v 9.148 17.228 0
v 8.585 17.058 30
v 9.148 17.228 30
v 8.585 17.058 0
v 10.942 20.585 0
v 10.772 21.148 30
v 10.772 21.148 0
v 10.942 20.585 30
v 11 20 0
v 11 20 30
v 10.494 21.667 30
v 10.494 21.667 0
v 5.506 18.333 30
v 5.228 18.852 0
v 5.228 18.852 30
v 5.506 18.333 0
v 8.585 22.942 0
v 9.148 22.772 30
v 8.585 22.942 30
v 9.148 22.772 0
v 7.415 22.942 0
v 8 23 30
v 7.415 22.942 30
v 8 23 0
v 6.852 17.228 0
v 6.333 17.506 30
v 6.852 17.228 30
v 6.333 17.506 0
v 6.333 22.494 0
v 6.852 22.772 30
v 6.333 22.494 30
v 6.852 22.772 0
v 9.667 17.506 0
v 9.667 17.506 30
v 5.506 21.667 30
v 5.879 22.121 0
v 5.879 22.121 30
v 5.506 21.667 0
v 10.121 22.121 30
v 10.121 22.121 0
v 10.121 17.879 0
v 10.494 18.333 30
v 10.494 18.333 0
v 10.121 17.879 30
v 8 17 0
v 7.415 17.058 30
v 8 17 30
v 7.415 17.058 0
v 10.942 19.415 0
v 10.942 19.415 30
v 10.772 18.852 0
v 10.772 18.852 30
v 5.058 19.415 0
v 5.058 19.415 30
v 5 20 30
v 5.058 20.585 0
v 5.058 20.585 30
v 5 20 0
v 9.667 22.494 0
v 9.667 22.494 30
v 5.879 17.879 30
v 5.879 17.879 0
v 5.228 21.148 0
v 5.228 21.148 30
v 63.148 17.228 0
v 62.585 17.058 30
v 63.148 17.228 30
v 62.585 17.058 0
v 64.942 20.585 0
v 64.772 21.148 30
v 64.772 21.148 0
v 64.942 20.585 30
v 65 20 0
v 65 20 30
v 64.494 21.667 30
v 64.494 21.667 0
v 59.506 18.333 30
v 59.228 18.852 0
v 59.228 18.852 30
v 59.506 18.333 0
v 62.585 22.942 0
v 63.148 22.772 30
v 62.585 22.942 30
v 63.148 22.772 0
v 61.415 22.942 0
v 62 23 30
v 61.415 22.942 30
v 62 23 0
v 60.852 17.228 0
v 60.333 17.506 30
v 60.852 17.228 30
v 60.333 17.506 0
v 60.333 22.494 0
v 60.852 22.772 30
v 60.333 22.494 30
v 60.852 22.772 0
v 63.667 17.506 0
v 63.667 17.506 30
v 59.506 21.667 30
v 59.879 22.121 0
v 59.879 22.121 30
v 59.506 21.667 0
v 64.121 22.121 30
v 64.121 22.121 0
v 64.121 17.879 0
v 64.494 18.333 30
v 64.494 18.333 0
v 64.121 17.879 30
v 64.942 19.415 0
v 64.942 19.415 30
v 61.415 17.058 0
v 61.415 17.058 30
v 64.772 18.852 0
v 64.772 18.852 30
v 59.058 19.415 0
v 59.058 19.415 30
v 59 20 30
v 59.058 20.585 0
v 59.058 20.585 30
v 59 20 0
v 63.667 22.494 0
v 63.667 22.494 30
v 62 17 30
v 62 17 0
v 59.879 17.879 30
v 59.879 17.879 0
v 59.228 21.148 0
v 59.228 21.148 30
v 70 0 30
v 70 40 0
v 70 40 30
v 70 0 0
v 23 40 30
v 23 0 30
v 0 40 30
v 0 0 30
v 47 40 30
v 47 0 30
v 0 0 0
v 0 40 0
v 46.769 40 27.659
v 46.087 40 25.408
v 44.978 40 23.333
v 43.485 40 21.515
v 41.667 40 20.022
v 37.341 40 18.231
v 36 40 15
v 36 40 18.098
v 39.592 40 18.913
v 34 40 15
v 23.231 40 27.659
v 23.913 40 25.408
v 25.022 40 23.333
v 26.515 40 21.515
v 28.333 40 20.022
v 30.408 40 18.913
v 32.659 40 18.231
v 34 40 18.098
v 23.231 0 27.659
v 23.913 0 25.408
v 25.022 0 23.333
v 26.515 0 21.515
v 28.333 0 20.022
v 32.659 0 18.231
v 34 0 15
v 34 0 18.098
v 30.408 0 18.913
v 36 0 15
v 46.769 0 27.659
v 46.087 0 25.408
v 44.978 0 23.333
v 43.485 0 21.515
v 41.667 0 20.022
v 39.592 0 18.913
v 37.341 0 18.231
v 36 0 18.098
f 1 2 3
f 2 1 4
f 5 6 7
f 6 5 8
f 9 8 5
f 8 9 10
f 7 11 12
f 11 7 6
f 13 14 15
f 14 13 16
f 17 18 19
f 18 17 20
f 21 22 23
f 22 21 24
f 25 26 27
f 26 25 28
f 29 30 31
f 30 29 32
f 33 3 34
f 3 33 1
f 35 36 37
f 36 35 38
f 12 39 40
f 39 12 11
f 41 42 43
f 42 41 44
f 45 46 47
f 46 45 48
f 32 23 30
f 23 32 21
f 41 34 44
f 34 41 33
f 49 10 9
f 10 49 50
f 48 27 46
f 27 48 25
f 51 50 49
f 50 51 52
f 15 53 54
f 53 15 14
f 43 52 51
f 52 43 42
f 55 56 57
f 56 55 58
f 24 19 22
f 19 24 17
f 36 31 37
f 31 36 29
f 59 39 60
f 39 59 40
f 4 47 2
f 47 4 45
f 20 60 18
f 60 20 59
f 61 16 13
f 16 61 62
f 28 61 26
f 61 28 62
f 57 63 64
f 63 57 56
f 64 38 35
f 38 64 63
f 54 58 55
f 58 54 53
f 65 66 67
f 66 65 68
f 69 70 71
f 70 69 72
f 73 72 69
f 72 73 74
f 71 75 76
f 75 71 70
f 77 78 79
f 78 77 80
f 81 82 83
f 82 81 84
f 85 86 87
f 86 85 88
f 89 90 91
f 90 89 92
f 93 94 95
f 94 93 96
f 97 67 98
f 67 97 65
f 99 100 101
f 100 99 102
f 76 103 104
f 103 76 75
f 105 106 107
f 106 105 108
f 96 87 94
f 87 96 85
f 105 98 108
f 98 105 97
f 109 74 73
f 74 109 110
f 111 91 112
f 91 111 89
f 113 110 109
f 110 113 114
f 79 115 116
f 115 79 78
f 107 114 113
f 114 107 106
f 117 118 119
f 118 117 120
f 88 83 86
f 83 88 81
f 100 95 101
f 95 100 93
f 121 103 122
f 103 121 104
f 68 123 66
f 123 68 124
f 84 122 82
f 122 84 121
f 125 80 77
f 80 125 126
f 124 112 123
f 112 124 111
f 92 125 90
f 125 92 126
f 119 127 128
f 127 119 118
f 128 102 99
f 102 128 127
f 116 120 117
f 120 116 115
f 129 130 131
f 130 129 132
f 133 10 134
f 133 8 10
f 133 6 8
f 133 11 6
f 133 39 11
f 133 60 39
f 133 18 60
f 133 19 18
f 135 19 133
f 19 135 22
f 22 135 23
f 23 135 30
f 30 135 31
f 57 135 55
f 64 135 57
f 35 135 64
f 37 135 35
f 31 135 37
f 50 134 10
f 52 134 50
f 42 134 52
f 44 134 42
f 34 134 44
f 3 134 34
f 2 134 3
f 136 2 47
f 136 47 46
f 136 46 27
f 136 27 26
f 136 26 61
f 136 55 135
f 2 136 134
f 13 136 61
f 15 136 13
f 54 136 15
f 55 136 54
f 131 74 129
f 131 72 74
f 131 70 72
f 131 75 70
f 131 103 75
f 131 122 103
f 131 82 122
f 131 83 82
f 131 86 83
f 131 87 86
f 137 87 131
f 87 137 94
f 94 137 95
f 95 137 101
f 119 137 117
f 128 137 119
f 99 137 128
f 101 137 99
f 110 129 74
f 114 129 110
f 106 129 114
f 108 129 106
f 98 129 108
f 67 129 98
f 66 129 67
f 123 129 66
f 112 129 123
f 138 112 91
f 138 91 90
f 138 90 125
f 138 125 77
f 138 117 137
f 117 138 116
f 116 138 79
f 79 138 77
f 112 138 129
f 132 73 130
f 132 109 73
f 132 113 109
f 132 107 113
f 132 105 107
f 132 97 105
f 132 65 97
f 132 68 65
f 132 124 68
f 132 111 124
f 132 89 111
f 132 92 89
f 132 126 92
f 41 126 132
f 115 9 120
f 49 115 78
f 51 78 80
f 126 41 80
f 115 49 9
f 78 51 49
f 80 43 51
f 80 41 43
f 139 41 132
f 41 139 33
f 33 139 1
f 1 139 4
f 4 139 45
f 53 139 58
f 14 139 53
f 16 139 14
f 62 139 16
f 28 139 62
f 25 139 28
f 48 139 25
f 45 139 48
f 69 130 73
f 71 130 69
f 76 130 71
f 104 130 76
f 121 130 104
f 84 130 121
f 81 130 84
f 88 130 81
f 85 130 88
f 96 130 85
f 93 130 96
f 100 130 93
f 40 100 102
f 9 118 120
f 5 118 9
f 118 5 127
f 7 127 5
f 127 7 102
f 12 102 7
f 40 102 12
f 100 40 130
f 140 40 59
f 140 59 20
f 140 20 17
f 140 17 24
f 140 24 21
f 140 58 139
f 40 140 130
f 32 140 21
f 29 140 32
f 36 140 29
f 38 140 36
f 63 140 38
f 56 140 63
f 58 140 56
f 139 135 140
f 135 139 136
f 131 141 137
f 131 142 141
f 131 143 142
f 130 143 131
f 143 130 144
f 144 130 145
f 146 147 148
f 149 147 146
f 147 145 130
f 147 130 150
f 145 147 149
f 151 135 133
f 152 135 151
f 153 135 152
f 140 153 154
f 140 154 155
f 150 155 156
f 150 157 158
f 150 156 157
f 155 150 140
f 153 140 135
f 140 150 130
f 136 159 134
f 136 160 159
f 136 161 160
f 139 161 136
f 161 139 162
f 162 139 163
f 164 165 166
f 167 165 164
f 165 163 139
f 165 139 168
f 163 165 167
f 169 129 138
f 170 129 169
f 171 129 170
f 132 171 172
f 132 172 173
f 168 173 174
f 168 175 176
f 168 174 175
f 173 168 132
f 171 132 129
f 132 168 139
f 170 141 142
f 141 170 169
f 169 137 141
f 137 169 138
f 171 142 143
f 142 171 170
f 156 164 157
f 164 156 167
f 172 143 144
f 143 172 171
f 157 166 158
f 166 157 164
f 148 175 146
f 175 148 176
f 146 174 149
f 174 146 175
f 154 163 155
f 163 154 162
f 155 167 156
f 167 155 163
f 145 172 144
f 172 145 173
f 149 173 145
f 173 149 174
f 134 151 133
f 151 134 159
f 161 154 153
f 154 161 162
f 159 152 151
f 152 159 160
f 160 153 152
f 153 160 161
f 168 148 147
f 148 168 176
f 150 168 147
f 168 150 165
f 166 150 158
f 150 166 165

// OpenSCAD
$fn = 32;

// ----------------------------------------------------------------------
// Saddle clamp: split shaft clamp
// ----------------------------------------------------------------------

// --- parameters (mm) ---
blk_l = 70;               // block length, X
blk_w = 40;               // block width, Y
blk_h = 30;               // block height
clamp_r = 12;             // shaft groove radius
hole_r = 3;               // bolt hole radius
hole_m = 8;               // bolt hole margin from the ends
saw_w = 2;                // saw kerf width

saw_depth = clamp_r + 3;  // saw kerf depth

difference() {
  cube([blk_l, blk_w, blk_h]);
  translate([blk_l / 2, -1, blk_h])
    rotate([-90, 0, 0])
      cylinder(h = blk_w + 2, r = clamp_r);
  for (sx = [0, 1])
    translate([sx ? blk_l - hole_m : hole_m, blk_w / 2, -1])
      cylinder(r = hole_r, h = blk_h + 2);
  translate([blk_l / 2 - saw_w / 2, -1, blk_h - saw_depth])
    cube([saw_w, blk_w + 2, saw_depth + 1]);
}
